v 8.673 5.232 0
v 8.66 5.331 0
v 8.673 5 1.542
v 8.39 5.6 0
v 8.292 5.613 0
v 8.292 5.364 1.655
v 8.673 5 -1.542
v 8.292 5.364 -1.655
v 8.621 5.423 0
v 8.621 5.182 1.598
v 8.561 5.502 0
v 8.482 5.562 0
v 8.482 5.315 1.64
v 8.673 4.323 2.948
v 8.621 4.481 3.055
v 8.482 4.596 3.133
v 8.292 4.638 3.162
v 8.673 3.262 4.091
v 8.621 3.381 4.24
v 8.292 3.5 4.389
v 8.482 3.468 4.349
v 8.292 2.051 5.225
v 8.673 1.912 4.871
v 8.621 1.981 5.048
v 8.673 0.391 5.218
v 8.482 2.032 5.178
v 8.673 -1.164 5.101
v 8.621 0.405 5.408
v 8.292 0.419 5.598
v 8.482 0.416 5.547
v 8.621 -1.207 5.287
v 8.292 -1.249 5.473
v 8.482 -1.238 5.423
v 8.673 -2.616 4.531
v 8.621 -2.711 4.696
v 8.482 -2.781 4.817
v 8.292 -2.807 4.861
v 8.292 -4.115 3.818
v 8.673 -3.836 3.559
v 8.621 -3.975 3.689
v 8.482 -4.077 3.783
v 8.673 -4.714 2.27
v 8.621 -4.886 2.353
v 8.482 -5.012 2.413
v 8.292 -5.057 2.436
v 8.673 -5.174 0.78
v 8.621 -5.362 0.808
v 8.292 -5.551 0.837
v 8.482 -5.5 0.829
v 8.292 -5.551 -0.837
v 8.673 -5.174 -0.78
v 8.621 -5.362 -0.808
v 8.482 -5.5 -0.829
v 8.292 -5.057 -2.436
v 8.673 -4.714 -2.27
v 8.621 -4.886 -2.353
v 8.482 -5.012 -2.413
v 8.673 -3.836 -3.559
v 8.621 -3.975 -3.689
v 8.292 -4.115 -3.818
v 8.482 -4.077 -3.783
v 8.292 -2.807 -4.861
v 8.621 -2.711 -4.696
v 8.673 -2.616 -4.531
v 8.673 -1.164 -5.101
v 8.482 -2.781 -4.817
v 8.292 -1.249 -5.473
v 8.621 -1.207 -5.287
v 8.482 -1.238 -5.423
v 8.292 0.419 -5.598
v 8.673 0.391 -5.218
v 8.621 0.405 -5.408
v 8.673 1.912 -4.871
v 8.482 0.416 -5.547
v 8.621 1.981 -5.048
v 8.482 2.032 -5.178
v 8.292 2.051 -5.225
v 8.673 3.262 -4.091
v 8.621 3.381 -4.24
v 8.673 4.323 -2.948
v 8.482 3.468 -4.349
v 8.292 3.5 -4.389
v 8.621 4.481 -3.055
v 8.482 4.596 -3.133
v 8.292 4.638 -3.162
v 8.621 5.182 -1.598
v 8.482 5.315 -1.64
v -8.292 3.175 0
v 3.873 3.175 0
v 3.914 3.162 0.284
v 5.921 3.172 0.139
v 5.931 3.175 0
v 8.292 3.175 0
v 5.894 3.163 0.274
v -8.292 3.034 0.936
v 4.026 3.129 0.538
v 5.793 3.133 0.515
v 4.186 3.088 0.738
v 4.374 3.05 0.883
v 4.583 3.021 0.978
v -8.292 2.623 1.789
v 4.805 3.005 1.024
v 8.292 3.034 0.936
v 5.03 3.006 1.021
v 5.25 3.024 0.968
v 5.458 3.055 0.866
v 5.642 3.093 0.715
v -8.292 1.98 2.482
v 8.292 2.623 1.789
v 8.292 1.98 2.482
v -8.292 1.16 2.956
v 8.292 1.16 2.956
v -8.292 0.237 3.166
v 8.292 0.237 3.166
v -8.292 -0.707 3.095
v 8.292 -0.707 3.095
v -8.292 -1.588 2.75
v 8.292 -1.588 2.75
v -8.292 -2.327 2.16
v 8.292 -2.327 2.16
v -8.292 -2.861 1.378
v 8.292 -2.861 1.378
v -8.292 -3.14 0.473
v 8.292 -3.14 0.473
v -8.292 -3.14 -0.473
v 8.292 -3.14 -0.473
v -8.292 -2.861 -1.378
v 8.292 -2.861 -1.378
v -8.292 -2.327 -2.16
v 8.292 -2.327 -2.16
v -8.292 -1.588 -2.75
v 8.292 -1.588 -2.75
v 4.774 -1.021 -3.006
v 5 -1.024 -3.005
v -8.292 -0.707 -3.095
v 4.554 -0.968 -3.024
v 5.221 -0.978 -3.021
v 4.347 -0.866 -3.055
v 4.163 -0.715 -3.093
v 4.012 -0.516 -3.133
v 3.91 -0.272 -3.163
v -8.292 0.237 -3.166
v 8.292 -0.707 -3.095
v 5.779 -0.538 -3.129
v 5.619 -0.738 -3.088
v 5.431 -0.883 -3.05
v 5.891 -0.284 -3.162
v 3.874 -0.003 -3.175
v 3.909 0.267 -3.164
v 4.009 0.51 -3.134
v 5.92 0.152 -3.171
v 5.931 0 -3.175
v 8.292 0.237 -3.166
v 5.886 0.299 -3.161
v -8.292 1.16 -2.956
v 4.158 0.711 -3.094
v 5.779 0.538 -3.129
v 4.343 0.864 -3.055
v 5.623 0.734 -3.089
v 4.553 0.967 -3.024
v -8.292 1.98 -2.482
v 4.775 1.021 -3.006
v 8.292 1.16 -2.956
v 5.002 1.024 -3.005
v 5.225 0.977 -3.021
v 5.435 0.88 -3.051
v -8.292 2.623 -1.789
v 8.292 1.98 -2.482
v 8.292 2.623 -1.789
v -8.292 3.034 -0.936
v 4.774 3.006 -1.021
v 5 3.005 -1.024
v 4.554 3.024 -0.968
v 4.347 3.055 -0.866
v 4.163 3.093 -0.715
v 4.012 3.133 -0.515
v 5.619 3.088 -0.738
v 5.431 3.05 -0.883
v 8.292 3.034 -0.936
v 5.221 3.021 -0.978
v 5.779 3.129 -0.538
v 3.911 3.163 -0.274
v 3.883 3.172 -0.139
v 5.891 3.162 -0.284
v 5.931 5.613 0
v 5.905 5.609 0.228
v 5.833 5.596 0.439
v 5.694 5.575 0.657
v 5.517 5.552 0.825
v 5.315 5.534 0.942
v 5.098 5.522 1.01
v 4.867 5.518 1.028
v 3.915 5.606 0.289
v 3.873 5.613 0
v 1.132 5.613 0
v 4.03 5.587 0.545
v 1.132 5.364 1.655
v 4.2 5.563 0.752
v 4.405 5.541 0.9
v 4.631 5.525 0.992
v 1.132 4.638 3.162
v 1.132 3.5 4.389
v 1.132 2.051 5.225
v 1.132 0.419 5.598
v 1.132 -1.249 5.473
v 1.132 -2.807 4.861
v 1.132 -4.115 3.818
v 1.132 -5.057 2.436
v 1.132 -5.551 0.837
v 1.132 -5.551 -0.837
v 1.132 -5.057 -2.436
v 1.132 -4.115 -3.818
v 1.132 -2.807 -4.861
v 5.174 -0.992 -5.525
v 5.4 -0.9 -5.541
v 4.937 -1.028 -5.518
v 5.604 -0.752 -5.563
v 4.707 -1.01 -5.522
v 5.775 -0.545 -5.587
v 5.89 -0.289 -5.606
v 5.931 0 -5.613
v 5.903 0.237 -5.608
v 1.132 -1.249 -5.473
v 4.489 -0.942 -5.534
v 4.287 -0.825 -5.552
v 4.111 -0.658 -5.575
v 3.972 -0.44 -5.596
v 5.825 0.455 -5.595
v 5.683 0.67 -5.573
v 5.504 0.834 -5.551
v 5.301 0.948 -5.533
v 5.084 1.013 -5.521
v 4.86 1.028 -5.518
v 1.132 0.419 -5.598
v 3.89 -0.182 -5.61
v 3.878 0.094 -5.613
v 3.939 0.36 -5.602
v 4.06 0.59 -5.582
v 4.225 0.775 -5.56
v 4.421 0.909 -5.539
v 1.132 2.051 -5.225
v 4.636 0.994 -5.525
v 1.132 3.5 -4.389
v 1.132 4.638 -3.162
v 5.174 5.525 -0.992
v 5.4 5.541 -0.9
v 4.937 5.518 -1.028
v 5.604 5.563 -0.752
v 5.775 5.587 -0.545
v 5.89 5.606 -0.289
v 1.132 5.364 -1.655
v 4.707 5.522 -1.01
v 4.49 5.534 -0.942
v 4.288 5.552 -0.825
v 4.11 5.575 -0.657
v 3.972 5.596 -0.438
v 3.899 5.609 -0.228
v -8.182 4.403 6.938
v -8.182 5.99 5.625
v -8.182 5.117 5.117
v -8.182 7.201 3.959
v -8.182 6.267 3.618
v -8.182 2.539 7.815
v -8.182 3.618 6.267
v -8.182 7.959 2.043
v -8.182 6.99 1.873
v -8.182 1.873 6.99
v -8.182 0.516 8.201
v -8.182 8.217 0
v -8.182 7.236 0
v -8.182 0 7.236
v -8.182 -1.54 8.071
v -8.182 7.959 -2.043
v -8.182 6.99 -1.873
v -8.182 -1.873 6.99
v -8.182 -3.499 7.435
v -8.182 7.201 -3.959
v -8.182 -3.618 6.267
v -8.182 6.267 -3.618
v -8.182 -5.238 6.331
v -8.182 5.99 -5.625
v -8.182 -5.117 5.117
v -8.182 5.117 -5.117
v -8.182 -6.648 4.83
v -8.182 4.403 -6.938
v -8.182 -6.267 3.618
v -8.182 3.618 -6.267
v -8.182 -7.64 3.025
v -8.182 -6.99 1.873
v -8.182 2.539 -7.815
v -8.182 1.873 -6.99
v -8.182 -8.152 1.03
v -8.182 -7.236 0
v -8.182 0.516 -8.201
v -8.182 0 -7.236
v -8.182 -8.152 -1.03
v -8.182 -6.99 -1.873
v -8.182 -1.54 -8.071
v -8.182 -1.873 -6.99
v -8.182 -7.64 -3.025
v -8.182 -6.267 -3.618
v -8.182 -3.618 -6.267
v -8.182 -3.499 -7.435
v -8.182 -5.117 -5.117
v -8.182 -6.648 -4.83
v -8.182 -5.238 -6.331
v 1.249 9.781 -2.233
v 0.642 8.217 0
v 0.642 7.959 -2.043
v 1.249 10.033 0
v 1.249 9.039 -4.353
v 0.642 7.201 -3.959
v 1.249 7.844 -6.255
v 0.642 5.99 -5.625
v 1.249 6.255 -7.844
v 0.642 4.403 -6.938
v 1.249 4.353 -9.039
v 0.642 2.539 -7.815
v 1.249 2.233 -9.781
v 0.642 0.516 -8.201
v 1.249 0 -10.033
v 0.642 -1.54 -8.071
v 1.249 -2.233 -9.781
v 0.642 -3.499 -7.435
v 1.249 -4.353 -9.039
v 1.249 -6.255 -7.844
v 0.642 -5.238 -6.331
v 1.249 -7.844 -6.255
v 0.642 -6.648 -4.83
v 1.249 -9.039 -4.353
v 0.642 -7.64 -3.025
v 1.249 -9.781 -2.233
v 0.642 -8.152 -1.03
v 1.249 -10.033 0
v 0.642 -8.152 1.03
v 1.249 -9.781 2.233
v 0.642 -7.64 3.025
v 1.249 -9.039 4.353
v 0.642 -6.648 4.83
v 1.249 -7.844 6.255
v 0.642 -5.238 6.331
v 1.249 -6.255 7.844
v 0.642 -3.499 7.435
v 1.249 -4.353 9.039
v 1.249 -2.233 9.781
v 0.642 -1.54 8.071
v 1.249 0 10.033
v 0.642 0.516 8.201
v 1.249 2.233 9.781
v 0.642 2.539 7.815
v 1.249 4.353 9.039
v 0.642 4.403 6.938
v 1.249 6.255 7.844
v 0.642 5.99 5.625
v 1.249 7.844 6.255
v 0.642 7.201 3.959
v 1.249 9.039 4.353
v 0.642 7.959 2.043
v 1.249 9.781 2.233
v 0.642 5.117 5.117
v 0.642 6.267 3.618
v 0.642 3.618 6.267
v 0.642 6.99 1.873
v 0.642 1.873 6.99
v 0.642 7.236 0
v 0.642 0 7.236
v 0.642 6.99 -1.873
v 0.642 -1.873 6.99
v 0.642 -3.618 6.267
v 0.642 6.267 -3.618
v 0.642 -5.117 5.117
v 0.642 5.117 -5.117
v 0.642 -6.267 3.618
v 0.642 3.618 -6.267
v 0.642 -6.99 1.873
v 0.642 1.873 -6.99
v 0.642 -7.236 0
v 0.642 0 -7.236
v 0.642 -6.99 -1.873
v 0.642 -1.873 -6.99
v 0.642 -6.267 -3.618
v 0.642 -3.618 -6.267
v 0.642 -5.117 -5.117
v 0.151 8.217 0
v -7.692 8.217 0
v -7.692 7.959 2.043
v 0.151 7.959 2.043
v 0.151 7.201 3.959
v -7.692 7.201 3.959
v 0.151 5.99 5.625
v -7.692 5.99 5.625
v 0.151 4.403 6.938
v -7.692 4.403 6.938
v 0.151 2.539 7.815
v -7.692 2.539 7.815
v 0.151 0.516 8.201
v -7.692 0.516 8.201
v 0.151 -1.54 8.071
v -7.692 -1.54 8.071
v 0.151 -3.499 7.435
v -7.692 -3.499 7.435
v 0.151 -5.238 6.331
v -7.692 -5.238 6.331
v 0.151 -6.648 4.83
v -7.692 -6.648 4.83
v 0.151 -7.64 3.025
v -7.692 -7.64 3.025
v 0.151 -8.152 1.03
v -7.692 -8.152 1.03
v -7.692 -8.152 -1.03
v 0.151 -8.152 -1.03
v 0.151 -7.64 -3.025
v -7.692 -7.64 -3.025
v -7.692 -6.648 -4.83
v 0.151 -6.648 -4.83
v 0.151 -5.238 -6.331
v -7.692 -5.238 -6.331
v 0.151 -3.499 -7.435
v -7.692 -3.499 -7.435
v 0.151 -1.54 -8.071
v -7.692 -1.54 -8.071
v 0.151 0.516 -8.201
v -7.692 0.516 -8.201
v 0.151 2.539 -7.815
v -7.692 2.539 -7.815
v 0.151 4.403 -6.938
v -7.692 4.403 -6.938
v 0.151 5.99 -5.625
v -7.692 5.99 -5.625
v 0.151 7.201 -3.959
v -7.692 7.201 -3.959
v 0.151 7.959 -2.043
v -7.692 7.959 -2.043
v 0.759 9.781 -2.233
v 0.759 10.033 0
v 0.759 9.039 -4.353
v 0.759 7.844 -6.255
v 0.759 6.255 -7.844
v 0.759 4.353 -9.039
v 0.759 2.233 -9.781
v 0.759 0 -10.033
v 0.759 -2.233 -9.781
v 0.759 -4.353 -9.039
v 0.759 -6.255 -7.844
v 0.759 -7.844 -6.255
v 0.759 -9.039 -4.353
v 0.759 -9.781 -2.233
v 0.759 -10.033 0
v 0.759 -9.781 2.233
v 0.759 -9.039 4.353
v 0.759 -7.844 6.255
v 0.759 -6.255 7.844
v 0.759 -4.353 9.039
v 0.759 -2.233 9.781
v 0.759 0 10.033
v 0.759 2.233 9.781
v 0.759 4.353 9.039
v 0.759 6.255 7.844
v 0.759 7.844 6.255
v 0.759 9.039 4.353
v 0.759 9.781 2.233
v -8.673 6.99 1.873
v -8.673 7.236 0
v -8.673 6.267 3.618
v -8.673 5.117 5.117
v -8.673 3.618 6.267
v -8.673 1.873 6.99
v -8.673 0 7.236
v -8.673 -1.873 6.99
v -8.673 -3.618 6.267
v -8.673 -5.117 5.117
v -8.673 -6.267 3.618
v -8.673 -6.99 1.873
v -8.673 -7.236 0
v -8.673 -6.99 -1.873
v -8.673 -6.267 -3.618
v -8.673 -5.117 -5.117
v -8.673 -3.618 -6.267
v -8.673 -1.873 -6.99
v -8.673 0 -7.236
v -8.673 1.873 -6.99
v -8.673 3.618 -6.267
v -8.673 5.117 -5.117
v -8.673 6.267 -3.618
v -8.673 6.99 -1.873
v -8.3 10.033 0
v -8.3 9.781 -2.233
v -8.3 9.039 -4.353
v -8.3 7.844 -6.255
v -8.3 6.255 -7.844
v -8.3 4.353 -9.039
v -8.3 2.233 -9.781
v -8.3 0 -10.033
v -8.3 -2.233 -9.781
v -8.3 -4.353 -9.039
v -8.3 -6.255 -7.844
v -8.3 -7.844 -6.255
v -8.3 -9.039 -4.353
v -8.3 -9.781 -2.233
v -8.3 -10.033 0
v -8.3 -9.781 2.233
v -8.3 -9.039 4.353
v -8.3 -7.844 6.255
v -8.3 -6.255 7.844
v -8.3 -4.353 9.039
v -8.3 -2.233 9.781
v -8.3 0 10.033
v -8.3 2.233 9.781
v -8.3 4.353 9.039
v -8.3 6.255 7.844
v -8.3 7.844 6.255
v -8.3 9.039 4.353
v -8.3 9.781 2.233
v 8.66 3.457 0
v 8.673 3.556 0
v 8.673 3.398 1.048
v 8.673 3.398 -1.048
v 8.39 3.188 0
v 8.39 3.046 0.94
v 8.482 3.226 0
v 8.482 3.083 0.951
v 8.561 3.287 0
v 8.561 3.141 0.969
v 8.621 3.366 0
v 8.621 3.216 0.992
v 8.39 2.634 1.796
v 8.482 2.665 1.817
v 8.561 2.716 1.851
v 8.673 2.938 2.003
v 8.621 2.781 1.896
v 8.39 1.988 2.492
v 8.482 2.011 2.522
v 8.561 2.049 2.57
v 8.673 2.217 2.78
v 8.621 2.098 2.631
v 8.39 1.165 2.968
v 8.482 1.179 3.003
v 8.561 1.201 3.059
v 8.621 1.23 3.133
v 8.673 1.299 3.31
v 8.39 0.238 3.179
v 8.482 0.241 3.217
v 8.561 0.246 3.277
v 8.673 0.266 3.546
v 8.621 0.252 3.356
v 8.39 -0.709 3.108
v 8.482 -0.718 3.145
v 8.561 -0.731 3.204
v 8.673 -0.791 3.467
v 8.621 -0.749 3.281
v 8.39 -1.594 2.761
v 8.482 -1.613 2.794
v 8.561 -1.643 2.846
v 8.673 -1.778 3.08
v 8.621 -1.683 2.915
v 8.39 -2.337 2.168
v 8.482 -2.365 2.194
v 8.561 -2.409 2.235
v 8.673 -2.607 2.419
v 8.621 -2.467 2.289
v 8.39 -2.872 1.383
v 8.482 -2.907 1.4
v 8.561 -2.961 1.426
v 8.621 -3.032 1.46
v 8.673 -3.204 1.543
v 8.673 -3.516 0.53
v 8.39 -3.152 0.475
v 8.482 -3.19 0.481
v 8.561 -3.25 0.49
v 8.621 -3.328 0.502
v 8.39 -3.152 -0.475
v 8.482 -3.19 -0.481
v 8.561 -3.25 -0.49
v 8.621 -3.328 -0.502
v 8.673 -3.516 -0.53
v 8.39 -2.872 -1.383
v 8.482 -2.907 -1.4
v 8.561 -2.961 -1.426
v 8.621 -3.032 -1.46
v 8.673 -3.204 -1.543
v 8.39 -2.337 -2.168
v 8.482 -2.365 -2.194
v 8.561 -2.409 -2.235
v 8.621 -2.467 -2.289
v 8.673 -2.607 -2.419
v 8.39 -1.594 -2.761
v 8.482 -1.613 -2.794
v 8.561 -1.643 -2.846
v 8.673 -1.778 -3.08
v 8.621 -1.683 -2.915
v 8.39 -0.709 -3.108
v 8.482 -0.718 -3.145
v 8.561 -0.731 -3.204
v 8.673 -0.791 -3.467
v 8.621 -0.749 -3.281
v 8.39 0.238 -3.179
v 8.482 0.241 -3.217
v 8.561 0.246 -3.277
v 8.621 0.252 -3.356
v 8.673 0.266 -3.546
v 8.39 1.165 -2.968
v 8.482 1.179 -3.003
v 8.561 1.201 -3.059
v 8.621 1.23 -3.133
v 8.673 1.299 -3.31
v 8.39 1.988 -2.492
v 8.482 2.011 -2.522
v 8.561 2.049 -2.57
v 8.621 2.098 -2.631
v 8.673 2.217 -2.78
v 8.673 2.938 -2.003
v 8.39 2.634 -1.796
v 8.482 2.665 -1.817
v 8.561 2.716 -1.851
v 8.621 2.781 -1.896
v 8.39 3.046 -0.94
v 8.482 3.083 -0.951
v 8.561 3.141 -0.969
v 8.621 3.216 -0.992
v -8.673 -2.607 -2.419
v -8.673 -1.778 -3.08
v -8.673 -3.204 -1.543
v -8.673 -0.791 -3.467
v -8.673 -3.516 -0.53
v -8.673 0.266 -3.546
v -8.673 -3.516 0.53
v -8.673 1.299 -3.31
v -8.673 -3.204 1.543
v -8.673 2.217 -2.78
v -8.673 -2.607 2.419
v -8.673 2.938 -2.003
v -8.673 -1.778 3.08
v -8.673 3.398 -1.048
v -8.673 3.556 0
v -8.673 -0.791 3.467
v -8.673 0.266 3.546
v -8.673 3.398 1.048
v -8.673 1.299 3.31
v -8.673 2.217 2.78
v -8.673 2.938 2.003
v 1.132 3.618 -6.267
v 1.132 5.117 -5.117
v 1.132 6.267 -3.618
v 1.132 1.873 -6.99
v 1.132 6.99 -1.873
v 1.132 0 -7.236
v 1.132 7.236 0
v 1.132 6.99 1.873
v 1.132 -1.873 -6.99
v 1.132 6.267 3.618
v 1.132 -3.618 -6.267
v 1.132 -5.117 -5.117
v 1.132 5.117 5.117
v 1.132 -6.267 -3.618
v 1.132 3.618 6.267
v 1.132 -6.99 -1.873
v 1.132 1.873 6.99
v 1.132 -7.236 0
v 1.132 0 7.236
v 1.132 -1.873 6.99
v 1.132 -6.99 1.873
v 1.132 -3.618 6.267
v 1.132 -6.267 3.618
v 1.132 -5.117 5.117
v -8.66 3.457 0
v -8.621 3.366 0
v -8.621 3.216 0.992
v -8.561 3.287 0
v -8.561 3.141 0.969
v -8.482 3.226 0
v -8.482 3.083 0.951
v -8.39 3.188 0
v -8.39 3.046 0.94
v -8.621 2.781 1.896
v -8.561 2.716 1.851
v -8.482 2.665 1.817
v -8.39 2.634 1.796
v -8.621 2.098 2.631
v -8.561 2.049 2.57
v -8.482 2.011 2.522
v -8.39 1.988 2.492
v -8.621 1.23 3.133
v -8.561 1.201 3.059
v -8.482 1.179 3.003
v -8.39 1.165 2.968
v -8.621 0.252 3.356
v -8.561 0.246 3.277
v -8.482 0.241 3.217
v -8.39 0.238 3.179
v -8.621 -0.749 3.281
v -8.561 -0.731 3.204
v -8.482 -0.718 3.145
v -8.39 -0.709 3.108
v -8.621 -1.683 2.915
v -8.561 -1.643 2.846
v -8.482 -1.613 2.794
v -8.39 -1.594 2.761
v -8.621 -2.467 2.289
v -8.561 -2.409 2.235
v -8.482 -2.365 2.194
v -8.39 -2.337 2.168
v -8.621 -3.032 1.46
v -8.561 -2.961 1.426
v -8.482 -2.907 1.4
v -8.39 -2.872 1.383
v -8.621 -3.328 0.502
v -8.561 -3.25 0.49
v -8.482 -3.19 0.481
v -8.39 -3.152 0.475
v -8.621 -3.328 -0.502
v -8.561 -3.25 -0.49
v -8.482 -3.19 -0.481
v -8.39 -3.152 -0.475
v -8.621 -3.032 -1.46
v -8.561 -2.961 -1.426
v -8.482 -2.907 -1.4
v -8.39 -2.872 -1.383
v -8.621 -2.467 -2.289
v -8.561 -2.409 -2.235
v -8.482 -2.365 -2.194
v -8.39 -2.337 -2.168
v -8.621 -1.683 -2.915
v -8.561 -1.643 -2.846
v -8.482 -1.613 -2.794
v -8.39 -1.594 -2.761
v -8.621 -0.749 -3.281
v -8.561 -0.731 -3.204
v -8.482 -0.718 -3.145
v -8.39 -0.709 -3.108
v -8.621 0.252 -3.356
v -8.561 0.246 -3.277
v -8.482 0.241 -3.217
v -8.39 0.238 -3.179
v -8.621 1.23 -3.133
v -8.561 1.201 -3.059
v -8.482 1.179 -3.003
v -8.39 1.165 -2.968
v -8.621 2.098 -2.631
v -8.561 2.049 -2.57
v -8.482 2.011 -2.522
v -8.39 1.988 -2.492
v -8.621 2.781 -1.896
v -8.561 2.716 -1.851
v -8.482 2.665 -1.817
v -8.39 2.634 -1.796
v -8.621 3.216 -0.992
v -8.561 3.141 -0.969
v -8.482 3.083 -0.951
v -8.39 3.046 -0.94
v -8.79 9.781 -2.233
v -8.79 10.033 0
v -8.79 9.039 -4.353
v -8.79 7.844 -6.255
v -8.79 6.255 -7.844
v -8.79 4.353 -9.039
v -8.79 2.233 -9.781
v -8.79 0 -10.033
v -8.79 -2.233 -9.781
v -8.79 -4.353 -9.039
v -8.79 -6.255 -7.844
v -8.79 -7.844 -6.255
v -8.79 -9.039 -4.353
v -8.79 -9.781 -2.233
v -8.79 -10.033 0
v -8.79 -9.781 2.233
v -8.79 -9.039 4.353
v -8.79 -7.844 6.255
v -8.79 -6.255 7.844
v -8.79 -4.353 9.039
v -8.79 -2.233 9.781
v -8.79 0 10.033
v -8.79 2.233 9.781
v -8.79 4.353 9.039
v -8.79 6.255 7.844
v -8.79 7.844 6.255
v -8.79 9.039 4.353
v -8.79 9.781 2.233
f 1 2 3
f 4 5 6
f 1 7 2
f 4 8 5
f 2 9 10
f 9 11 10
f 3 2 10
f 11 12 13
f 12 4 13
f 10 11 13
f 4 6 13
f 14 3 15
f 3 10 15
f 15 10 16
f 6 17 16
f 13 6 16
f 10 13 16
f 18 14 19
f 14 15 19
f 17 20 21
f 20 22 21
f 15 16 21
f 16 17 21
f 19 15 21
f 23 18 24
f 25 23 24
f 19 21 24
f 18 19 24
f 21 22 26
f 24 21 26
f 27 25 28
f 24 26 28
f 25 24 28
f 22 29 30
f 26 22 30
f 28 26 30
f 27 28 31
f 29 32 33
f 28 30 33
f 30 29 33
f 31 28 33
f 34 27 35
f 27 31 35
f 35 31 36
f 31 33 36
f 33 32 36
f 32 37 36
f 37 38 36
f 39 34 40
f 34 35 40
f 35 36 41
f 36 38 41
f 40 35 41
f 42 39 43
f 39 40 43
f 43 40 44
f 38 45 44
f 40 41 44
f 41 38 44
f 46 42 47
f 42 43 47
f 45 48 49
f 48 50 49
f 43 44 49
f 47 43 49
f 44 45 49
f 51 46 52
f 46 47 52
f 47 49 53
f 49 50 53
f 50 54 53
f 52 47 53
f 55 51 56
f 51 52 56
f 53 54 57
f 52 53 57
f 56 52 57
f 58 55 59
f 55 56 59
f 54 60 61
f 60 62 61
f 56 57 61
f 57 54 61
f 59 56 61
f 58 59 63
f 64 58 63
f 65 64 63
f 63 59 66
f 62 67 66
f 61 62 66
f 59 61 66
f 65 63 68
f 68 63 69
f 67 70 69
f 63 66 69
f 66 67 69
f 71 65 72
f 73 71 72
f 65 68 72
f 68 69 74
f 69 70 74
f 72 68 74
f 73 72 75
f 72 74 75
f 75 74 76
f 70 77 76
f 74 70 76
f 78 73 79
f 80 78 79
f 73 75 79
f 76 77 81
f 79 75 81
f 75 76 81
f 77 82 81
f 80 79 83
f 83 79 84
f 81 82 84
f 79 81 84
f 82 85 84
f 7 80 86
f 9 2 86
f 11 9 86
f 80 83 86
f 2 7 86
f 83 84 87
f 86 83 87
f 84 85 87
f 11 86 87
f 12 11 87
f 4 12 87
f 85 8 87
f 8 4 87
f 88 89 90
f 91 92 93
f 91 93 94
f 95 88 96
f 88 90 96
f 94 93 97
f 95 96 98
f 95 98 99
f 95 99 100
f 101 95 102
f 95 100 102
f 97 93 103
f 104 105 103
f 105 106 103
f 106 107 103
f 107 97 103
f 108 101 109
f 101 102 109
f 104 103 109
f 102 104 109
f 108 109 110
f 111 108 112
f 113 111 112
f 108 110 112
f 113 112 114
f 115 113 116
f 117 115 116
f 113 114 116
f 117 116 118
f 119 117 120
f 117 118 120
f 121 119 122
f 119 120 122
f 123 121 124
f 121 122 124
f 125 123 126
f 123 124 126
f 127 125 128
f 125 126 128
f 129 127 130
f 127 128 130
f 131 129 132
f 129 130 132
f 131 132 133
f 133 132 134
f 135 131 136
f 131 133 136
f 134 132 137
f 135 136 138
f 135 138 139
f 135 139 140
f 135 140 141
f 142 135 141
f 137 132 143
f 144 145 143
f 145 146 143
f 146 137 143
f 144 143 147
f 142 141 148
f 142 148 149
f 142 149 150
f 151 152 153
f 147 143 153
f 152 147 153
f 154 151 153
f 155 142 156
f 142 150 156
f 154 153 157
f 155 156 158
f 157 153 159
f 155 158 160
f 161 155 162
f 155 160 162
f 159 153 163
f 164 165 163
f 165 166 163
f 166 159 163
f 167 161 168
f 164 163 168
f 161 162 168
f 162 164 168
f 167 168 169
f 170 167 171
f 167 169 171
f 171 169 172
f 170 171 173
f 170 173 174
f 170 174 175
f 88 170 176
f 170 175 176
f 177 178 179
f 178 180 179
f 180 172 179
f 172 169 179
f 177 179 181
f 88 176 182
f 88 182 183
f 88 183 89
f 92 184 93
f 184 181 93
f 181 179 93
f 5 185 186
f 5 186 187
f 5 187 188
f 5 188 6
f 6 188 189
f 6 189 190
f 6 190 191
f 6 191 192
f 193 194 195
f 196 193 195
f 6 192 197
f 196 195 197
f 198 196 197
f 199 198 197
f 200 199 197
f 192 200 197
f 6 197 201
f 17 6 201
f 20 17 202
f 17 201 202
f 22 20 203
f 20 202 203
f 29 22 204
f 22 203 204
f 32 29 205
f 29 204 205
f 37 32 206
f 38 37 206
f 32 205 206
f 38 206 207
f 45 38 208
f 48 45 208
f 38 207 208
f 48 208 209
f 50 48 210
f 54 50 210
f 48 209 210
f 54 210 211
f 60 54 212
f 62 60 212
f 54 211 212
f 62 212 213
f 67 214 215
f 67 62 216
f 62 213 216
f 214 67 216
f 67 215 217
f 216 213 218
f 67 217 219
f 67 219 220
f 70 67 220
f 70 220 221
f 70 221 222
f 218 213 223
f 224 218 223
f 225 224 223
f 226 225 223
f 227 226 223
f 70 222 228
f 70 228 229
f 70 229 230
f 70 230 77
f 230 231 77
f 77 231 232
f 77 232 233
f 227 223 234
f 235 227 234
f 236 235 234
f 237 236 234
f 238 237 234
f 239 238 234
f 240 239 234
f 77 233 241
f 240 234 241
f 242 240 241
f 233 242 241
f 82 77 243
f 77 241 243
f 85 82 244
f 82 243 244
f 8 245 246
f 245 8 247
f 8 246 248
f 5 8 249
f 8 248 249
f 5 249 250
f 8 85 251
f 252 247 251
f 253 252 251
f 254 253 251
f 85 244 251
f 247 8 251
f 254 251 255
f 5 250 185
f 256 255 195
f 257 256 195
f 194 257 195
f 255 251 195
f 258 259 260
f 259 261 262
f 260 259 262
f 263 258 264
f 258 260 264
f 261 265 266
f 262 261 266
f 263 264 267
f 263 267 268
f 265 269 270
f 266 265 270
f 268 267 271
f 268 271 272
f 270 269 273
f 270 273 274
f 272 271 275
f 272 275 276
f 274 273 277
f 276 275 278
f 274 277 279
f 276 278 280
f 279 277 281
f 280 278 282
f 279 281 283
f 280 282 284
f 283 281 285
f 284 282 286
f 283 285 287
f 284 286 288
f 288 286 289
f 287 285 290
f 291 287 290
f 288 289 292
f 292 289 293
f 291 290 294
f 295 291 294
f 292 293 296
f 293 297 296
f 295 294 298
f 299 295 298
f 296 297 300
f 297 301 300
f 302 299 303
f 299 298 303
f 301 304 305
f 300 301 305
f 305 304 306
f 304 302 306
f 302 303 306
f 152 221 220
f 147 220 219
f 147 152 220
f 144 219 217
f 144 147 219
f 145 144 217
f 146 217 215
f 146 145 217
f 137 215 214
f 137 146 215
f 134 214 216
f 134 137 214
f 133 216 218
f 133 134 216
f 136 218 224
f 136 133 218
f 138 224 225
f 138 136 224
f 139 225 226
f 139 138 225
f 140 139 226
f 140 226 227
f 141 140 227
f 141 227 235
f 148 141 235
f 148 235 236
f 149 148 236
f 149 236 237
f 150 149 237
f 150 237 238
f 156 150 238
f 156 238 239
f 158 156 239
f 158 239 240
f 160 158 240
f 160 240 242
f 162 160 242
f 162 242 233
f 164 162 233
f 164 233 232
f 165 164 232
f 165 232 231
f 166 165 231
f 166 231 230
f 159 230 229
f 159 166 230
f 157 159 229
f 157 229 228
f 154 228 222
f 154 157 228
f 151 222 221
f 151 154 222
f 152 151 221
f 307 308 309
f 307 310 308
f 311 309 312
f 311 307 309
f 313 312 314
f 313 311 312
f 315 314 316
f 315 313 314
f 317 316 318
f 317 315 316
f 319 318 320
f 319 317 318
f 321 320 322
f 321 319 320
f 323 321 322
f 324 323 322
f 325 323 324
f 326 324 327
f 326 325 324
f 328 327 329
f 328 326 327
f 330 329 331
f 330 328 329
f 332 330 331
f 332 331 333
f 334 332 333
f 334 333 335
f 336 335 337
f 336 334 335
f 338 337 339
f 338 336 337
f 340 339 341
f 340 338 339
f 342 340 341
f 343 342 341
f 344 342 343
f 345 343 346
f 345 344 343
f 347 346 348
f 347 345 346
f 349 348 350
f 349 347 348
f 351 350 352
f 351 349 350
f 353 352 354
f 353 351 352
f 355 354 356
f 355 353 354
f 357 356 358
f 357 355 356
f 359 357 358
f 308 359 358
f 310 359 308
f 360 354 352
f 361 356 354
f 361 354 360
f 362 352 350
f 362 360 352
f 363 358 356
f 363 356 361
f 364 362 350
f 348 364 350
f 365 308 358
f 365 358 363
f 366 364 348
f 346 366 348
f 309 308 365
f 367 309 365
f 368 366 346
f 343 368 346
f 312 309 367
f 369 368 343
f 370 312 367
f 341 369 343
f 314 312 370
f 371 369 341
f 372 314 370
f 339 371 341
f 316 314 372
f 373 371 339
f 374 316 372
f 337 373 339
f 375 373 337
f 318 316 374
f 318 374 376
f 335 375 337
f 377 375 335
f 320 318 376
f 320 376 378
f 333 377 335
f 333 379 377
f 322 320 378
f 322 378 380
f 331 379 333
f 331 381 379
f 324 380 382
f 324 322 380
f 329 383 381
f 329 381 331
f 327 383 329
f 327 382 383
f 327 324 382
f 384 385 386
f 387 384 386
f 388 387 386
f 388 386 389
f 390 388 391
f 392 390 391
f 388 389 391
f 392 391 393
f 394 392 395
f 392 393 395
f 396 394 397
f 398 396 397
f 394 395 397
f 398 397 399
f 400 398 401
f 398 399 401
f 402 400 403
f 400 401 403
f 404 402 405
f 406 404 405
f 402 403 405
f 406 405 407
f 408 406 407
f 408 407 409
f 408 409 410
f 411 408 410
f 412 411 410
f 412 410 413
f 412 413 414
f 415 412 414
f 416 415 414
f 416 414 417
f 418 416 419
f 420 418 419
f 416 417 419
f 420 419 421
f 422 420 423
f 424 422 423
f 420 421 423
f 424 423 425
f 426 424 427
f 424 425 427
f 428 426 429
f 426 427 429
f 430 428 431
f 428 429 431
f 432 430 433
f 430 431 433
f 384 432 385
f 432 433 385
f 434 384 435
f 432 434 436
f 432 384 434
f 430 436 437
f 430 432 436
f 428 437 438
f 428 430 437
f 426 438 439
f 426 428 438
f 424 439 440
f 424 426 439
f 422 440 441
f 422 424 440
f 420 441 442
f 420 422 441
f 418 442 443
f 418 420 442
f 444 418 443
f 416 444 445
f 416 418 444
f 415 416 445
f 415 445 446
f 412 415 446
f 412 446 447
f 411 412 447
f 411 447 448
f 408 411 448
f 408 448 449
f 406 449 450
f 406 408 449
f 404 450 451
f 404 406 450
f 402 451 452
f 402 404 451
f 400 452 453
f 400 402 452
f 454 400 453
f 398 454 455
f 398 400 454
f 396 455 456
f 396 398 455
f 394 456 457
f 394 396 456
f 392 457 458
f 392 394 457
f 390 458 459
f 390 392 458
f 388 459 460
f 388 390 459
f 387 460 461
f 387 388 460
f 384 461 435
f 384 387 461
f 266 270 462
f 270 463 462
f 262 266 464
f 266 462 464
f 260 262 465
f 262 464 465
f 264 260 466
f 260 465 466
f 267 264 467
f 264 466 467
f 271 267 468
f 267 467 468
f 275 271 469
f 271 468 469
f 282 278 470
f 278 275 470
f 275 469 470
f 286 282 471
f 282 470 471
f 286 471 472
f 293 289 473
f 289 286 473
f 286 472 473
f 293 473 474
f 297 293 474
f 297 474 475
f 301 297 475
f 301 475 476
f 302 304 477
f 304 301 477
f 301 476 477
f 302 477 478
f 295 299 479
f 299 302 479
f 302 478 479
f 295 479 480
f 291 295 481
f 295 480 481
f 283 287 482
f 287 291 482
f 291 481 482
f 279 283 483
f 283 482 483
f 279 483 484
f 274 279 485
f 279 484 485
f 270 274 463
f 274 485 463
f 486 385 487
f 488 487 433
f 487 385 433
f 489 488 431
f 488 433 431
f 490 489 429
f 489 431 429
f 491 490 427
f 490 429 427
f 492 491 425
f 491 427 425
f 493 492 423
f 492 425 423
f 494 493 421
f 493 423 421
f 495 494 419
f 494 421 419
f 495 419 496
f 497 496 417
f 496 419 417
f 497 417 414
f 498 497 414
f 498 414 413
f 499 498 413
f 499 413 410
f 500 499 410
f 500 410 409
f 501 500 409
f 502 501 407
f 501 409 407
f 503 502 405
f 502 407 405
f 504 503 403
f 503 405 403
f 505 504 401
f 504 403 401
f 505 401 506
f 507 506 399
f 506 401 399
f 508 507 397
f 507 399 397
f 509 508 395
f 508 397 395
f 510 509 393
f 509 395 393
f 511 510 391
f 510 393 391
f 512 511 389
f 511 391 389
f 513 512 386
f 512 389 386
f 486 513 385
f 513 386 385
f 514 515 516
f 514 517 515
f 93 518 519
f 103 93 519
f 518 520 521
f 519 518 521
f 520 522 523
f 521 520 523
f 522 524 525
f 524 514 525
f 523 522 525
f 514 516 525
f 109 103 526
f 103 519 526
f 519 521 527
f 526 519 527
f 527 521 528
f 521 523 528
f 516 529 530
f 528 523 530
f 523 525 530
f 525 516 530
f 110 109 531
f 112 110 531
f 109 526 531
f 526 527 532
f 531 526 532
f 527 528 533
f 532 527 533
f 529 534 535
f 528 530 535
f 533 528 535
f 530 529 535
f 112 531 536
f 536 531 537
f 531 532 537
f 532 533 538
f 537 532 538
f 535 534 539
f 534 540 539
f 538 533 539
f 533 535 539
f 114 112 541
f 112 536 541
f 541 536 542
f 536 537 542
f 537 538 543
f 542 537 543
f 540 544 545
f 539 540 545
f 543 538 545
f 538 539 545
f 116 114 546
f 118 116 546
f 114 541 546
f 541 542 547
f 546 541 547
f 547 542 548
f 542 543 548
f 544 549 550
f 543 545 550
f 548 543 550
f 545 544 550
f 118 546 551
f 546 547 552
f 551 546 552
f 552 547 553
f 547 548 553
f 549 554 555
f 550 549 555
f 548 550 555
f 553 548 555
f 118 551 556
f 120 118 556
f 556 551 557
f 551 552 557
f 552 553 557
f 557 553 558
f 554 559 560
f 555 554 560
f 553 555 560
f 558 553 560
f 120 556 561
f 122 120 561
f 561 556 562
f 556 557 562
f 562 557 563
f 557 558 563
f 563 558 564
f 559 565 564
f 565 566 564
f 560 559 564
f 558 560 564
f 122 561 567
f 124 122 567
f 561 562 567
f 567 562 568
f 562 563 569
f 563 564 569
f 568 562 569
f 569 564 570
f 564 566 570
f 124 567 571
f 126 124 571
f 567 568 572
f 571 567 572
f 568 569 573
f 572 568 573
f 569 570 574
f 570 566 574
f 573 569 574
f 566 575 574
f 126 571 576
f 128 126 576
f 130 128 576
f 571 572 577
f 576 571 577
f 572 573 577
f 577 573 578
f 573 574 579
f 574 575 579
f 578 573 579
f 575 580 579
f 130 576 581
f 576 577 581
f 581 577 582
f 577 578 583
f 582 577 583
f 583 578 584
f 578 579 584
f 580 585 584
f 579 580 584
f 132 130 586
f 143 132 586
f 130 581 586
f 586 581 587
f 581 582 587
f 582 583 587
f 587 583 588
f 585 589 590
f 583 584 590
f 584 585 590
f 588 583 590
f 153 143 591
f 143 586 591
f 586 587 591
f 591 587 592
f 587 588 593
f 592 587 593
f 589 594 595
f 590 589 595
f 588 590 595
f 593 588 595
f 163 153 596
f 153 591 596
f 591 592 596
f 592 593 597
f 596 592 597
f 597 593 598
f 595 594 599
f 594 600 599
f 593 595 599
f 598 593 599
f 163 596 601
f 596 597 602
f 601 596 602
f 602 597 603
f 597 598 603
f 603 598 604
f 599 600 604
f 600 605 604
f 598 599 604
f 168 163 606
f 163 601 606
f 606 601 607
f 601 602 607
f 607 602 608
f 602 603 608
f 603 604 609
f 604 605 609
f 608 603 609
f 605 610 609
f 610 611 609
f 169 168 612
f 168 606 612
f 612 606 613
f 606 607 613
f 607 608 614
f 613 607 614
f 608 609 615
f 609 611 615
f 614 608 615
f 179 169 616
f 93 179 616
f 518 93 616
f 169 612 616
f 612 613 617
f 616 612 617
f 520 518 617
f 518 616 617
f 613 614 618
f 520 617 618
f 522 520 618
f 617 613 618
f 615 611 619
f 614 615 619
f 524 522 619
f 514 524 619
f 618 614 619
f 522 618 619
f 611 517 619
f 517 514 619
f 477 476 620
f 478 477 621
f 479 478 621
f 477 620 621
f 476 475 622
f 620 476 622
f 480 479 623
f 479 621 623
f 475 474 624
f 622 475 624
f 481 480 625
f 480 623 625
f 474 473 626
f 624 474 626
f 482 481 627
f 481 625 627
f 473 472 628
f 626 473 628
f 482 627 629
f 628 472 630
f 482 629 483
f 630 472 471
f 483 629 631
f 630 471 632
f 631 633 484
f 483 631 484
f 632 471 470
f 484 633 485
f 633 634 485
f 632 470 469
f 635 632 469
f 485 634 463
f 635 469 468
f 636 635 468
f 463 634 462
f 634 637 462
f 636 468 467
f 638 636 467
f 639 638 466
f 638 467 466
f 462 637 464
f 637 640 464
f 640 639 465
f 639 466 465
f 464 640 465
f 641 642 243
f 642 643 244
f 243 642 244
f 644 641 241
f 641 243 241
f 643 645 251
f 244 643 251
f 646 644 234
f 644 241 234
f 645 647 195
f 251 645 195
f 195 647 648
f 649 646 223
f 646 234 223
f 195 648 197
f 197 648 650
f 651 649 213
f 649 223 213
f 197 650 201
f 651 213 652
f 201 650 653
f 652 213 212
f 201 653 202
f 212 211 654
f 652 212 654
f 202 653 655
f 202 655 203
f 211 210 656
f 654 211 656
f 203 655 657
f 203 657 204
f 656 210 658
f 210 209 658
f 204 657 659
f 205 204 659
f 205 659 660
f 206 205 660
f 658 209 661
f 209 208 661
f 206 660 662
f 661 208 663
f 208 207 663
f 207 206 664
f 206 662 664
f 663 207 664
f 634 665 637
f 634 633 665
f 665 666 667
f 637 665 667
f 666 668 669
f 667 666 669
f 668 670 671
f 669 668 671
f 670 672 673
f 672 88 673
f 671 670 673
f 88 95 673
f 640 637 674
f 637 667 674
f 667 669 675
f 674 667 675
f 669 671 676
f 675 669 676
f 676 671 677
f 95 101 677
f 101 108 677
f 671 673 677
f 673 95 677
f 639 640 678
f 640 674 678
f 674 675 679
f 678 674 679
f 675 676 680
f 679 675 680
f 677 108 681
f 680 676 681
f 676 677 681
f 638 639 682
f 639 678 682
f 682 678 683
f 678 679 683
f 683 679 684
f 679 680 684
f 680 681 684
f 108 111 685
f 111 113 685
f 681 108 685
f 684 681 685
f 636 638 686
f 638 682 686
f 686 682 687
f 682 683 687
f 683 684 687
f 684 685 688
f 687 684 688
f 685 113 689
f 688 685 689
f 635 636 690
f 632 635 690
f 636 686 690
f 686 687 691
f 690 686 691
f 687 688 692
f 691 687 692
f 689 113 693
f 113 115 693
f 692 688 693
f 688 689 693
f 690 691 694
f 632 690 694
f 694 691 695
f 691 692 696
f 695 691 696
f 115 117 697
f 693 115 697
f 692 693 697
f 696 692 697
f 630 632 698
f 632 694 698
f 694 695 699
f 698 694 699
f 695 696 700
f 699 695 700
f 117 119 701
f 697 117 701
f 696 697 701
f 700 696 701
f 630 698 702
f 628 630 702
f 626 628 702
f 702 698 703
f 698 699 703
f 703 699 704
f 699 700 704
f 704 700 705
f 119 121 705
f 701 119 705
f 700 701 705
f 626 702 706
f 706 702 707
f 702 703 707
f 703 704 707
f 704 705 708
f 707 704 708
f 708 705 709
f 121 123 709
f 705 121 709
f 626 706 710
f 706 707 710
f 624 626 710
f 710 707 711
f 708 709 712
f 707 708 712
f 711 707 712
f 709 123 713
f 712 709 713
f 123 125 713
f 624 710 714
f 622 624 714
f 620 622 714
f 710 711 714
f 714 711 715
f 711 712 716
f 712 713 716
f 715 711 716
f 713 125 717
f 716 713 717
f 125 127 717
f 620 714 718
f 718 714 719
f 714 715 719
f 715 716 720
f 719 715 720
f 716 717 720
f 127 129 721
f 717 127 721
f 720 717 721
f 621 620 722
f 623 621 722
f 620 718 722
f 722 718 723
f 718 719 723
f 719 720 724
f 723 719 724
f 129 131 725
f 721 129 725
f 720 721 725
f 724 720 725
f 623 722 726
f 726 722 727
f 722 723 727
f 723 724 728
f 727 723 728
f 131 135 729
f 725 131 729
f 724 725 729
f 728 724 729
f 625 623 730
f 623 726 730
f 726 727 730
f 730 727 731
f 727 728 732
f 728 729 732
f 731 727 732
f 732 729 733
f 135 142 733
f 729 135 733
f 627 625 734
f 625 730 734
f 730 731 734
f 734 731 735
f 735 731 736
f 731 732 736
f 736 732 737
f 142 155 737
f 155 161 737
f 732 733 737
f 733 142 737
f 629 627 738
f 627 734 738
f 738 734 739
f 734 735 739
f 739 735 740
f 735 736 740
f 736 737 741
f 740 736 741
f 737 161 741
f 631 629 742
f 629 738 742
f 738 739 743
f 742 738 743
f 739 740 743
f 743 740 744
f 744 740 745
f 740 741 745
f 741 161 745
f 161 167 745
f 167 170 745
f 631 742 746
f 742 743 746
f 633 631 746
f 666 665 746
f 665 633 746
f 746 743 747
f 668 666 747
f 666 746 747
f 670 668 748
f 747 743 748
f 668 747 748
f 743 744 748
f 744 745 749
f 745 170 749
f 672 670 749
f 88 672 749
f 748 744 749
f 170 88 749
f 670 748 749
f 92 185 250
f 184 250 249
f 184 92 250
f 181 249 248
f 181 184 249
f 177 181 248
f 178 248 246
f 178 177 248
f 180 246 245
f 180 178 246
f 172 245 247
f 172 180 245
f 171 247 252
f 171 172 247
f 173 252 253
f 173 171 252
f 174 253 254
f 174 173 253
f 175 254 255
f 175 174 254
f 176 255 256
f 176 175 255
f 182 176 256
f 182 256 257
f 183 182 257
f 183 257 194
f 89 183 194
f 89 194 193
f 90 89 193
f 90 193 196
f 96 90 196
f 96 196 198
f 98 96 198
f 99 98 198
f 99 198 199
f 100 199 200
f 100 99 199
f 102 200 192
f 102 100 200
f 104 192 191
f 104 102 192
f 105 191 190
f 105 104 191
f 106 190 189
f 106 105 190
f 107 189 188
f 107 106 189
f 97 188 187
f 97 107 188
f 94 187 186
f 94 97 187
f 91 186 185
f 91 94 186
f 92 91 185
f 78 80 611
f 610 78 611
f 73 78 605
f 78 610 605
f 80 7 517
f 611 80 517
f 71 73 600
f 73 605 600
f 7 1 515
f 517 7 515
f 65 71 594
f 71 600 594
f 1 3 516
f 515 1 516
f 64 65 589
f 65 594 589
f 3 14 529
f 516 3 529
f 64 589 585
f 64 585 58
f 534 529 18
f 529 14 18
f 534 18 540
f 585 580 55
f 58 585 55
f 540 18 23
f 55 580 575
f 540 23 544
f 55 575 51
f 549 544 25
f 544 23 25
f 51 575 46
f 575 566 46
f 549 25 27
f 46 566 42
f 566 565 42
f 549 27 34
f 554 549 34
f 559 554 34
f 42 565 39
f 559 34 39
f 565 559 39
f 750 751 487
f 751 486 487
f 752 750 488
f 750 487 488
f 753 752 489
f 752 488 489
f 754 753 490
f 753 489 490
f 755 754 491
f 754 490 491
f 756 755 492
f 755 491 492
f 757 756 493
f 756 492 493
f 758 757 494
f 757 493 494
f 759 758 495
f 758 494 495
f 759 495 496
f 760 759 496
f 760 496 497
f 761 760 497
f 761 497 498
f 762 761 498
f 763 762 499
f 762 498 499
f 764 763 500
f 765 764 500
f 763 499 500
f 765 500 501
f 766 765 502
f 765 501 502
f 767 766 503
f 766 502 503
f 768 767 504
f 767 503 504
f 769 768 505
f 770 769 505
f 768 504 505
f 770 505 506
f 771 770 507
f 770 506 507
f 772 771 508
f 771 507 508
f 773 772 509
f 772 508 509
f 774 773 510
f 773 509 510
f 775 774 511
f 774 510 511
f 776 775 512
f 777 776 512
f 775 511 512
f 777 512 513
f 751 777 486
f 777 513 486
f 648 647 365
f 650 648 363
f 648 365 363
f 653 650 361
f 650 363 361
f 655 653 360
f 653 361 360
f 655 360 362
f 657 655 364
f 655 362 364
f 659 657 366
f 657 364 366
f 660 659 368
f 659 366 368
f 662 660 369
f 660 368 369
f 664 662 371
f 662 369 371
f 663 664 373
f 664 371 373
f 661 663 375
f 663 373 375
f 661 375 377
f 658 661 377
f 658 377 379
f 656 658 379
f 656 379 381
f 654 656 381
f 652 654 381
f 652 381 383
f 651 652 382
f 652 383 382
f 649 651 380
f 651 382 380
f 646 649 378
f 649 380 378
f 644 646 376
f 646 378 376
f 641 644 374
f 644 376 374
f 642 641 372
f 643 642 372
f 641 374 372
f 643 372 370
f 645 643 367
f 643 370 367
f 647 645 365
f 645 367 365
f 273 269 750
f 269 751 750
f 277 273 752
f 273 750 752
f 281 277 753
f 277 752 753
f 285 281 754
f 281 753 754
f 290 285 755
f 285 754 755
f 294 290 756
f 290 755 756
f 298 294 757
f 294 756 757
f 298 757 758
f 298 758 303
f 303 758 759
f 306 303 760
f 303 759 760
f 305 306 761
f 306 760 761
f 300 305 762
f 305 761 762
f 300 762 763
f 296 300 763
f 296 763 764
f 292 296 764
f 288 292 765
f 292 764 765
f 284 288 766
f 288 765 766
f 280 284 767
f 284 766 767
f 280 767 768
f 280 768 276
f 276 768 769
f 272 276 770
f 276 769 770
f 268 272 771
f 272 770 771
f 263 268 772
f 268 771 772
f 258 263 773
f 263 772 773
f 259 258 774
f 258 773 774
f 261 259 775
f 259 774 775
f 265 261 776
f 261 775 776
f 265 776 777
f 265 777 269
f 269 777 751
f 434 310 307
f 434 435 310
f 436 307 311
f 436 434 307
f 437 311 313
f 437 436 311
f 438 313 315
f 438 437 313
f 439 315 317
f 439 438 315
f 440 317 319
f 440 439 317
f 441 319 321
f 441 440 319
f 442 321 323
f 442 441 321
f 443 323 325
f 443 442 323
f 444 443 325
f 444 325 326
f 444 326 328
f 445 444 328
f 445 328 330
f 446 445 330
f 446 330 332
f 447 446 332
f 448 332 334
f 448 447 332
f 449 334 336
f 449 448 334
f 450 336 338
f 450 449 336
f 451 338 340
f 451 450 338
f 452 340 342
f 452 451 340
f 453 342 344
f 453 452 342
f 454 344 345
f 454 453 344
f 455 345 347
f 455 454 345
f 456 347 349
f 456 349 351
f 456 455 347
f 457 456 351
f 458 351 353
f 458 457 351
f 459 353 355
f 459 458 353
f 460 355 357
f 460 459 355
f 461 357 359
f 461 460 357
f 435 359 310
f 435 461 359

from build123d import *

# Parameters (mm, degrees)
SKETCH3_R         = 1.0287
SCREW_HOLE_DEPTH  = 11.033
CIRPATTERN1_COUNT = 2
CIRPATTERN1_ANGLE = 90
FILLET1_R         = 0.381


with BuildPart() as part:
    # Sketch2 → PULLEY (revolve)
    with BuildSketch(Plane.XY):
        Polygon((-8.6725125, 3.175), (8.6725125, 3.175), (8.6725125, 5.6134), (1.1318875, 5.6134), (1.1318875, 7.23646), (0.1514475, 7.23646), (0.1514475, 8.2169), (-7.6920725, 8.2169), (-7.6920725, 7.23646), (-8.6725125, 7.23646), align=None)
    revolve(axis=Axis((-8.6725125, 0, 0), (1, 0, 0)))

    # Sketch4 → Flange (revolve)
    with BuildSketch(Plane.XY):
        Polygon((-8.1822925, 7.23646), (-8.1822925, 8.2169), (-8.7899875, 10.033), (-8.2997675, 10.033), (-7.6920725, 8.2169), (-7.6920725, 7.23646), align=None)
        Polygon((0.1514475, 7.23646), (0.6416675, 7.23646), (0.6416675, 8.2169), (1.2493625, 10.033), (0.7591425, 10.033), (0.1514475, 8.2169), align=None)
    revolve(axis=Axis((0, 0, 0), (-1, 0, 0)))

    # Sketch3 → SCREW HOLE (cut, through all)
    with BuildSketch(Plane(origin=(0, 0, 0), x_dir=(1, 0, 0), z_dir=(0, 1, 0))):
        with Locations((4.9022, 0)):
            Circle(SKETCH3_R)
    screw_hole = extrude(amount=SCREW_HOLE_DEPTH, mode=Mode.SUBTRACT)

    # CirPattern1: SCREW HOLE ×2 about axis
    cirpattern1_axis = Axis((-8.6725125, 0, 0), (-1, 0, 0))
    for i in range(1, CIRPATTERN1_COUNT):
        add(screw_hole.rotate(cirpattern1_axis, i * CIRPATTERN1_ANGLE / (CIRPATTERN1_COUNT - 1)), mode=Mode.SUBTRACT)

    # Fillet1
    fillet1_edges = [part.edges().sort_by_distance(p)[0] for p in [
        (-8.6725125, -3.175, 0),
        (8.6725125, -3.175, 0),
        (8.6725125, -5.6134, 0),
    ]]
    fillet(fillet1_edges, radius=FILLET1_R)


solid = part.part
